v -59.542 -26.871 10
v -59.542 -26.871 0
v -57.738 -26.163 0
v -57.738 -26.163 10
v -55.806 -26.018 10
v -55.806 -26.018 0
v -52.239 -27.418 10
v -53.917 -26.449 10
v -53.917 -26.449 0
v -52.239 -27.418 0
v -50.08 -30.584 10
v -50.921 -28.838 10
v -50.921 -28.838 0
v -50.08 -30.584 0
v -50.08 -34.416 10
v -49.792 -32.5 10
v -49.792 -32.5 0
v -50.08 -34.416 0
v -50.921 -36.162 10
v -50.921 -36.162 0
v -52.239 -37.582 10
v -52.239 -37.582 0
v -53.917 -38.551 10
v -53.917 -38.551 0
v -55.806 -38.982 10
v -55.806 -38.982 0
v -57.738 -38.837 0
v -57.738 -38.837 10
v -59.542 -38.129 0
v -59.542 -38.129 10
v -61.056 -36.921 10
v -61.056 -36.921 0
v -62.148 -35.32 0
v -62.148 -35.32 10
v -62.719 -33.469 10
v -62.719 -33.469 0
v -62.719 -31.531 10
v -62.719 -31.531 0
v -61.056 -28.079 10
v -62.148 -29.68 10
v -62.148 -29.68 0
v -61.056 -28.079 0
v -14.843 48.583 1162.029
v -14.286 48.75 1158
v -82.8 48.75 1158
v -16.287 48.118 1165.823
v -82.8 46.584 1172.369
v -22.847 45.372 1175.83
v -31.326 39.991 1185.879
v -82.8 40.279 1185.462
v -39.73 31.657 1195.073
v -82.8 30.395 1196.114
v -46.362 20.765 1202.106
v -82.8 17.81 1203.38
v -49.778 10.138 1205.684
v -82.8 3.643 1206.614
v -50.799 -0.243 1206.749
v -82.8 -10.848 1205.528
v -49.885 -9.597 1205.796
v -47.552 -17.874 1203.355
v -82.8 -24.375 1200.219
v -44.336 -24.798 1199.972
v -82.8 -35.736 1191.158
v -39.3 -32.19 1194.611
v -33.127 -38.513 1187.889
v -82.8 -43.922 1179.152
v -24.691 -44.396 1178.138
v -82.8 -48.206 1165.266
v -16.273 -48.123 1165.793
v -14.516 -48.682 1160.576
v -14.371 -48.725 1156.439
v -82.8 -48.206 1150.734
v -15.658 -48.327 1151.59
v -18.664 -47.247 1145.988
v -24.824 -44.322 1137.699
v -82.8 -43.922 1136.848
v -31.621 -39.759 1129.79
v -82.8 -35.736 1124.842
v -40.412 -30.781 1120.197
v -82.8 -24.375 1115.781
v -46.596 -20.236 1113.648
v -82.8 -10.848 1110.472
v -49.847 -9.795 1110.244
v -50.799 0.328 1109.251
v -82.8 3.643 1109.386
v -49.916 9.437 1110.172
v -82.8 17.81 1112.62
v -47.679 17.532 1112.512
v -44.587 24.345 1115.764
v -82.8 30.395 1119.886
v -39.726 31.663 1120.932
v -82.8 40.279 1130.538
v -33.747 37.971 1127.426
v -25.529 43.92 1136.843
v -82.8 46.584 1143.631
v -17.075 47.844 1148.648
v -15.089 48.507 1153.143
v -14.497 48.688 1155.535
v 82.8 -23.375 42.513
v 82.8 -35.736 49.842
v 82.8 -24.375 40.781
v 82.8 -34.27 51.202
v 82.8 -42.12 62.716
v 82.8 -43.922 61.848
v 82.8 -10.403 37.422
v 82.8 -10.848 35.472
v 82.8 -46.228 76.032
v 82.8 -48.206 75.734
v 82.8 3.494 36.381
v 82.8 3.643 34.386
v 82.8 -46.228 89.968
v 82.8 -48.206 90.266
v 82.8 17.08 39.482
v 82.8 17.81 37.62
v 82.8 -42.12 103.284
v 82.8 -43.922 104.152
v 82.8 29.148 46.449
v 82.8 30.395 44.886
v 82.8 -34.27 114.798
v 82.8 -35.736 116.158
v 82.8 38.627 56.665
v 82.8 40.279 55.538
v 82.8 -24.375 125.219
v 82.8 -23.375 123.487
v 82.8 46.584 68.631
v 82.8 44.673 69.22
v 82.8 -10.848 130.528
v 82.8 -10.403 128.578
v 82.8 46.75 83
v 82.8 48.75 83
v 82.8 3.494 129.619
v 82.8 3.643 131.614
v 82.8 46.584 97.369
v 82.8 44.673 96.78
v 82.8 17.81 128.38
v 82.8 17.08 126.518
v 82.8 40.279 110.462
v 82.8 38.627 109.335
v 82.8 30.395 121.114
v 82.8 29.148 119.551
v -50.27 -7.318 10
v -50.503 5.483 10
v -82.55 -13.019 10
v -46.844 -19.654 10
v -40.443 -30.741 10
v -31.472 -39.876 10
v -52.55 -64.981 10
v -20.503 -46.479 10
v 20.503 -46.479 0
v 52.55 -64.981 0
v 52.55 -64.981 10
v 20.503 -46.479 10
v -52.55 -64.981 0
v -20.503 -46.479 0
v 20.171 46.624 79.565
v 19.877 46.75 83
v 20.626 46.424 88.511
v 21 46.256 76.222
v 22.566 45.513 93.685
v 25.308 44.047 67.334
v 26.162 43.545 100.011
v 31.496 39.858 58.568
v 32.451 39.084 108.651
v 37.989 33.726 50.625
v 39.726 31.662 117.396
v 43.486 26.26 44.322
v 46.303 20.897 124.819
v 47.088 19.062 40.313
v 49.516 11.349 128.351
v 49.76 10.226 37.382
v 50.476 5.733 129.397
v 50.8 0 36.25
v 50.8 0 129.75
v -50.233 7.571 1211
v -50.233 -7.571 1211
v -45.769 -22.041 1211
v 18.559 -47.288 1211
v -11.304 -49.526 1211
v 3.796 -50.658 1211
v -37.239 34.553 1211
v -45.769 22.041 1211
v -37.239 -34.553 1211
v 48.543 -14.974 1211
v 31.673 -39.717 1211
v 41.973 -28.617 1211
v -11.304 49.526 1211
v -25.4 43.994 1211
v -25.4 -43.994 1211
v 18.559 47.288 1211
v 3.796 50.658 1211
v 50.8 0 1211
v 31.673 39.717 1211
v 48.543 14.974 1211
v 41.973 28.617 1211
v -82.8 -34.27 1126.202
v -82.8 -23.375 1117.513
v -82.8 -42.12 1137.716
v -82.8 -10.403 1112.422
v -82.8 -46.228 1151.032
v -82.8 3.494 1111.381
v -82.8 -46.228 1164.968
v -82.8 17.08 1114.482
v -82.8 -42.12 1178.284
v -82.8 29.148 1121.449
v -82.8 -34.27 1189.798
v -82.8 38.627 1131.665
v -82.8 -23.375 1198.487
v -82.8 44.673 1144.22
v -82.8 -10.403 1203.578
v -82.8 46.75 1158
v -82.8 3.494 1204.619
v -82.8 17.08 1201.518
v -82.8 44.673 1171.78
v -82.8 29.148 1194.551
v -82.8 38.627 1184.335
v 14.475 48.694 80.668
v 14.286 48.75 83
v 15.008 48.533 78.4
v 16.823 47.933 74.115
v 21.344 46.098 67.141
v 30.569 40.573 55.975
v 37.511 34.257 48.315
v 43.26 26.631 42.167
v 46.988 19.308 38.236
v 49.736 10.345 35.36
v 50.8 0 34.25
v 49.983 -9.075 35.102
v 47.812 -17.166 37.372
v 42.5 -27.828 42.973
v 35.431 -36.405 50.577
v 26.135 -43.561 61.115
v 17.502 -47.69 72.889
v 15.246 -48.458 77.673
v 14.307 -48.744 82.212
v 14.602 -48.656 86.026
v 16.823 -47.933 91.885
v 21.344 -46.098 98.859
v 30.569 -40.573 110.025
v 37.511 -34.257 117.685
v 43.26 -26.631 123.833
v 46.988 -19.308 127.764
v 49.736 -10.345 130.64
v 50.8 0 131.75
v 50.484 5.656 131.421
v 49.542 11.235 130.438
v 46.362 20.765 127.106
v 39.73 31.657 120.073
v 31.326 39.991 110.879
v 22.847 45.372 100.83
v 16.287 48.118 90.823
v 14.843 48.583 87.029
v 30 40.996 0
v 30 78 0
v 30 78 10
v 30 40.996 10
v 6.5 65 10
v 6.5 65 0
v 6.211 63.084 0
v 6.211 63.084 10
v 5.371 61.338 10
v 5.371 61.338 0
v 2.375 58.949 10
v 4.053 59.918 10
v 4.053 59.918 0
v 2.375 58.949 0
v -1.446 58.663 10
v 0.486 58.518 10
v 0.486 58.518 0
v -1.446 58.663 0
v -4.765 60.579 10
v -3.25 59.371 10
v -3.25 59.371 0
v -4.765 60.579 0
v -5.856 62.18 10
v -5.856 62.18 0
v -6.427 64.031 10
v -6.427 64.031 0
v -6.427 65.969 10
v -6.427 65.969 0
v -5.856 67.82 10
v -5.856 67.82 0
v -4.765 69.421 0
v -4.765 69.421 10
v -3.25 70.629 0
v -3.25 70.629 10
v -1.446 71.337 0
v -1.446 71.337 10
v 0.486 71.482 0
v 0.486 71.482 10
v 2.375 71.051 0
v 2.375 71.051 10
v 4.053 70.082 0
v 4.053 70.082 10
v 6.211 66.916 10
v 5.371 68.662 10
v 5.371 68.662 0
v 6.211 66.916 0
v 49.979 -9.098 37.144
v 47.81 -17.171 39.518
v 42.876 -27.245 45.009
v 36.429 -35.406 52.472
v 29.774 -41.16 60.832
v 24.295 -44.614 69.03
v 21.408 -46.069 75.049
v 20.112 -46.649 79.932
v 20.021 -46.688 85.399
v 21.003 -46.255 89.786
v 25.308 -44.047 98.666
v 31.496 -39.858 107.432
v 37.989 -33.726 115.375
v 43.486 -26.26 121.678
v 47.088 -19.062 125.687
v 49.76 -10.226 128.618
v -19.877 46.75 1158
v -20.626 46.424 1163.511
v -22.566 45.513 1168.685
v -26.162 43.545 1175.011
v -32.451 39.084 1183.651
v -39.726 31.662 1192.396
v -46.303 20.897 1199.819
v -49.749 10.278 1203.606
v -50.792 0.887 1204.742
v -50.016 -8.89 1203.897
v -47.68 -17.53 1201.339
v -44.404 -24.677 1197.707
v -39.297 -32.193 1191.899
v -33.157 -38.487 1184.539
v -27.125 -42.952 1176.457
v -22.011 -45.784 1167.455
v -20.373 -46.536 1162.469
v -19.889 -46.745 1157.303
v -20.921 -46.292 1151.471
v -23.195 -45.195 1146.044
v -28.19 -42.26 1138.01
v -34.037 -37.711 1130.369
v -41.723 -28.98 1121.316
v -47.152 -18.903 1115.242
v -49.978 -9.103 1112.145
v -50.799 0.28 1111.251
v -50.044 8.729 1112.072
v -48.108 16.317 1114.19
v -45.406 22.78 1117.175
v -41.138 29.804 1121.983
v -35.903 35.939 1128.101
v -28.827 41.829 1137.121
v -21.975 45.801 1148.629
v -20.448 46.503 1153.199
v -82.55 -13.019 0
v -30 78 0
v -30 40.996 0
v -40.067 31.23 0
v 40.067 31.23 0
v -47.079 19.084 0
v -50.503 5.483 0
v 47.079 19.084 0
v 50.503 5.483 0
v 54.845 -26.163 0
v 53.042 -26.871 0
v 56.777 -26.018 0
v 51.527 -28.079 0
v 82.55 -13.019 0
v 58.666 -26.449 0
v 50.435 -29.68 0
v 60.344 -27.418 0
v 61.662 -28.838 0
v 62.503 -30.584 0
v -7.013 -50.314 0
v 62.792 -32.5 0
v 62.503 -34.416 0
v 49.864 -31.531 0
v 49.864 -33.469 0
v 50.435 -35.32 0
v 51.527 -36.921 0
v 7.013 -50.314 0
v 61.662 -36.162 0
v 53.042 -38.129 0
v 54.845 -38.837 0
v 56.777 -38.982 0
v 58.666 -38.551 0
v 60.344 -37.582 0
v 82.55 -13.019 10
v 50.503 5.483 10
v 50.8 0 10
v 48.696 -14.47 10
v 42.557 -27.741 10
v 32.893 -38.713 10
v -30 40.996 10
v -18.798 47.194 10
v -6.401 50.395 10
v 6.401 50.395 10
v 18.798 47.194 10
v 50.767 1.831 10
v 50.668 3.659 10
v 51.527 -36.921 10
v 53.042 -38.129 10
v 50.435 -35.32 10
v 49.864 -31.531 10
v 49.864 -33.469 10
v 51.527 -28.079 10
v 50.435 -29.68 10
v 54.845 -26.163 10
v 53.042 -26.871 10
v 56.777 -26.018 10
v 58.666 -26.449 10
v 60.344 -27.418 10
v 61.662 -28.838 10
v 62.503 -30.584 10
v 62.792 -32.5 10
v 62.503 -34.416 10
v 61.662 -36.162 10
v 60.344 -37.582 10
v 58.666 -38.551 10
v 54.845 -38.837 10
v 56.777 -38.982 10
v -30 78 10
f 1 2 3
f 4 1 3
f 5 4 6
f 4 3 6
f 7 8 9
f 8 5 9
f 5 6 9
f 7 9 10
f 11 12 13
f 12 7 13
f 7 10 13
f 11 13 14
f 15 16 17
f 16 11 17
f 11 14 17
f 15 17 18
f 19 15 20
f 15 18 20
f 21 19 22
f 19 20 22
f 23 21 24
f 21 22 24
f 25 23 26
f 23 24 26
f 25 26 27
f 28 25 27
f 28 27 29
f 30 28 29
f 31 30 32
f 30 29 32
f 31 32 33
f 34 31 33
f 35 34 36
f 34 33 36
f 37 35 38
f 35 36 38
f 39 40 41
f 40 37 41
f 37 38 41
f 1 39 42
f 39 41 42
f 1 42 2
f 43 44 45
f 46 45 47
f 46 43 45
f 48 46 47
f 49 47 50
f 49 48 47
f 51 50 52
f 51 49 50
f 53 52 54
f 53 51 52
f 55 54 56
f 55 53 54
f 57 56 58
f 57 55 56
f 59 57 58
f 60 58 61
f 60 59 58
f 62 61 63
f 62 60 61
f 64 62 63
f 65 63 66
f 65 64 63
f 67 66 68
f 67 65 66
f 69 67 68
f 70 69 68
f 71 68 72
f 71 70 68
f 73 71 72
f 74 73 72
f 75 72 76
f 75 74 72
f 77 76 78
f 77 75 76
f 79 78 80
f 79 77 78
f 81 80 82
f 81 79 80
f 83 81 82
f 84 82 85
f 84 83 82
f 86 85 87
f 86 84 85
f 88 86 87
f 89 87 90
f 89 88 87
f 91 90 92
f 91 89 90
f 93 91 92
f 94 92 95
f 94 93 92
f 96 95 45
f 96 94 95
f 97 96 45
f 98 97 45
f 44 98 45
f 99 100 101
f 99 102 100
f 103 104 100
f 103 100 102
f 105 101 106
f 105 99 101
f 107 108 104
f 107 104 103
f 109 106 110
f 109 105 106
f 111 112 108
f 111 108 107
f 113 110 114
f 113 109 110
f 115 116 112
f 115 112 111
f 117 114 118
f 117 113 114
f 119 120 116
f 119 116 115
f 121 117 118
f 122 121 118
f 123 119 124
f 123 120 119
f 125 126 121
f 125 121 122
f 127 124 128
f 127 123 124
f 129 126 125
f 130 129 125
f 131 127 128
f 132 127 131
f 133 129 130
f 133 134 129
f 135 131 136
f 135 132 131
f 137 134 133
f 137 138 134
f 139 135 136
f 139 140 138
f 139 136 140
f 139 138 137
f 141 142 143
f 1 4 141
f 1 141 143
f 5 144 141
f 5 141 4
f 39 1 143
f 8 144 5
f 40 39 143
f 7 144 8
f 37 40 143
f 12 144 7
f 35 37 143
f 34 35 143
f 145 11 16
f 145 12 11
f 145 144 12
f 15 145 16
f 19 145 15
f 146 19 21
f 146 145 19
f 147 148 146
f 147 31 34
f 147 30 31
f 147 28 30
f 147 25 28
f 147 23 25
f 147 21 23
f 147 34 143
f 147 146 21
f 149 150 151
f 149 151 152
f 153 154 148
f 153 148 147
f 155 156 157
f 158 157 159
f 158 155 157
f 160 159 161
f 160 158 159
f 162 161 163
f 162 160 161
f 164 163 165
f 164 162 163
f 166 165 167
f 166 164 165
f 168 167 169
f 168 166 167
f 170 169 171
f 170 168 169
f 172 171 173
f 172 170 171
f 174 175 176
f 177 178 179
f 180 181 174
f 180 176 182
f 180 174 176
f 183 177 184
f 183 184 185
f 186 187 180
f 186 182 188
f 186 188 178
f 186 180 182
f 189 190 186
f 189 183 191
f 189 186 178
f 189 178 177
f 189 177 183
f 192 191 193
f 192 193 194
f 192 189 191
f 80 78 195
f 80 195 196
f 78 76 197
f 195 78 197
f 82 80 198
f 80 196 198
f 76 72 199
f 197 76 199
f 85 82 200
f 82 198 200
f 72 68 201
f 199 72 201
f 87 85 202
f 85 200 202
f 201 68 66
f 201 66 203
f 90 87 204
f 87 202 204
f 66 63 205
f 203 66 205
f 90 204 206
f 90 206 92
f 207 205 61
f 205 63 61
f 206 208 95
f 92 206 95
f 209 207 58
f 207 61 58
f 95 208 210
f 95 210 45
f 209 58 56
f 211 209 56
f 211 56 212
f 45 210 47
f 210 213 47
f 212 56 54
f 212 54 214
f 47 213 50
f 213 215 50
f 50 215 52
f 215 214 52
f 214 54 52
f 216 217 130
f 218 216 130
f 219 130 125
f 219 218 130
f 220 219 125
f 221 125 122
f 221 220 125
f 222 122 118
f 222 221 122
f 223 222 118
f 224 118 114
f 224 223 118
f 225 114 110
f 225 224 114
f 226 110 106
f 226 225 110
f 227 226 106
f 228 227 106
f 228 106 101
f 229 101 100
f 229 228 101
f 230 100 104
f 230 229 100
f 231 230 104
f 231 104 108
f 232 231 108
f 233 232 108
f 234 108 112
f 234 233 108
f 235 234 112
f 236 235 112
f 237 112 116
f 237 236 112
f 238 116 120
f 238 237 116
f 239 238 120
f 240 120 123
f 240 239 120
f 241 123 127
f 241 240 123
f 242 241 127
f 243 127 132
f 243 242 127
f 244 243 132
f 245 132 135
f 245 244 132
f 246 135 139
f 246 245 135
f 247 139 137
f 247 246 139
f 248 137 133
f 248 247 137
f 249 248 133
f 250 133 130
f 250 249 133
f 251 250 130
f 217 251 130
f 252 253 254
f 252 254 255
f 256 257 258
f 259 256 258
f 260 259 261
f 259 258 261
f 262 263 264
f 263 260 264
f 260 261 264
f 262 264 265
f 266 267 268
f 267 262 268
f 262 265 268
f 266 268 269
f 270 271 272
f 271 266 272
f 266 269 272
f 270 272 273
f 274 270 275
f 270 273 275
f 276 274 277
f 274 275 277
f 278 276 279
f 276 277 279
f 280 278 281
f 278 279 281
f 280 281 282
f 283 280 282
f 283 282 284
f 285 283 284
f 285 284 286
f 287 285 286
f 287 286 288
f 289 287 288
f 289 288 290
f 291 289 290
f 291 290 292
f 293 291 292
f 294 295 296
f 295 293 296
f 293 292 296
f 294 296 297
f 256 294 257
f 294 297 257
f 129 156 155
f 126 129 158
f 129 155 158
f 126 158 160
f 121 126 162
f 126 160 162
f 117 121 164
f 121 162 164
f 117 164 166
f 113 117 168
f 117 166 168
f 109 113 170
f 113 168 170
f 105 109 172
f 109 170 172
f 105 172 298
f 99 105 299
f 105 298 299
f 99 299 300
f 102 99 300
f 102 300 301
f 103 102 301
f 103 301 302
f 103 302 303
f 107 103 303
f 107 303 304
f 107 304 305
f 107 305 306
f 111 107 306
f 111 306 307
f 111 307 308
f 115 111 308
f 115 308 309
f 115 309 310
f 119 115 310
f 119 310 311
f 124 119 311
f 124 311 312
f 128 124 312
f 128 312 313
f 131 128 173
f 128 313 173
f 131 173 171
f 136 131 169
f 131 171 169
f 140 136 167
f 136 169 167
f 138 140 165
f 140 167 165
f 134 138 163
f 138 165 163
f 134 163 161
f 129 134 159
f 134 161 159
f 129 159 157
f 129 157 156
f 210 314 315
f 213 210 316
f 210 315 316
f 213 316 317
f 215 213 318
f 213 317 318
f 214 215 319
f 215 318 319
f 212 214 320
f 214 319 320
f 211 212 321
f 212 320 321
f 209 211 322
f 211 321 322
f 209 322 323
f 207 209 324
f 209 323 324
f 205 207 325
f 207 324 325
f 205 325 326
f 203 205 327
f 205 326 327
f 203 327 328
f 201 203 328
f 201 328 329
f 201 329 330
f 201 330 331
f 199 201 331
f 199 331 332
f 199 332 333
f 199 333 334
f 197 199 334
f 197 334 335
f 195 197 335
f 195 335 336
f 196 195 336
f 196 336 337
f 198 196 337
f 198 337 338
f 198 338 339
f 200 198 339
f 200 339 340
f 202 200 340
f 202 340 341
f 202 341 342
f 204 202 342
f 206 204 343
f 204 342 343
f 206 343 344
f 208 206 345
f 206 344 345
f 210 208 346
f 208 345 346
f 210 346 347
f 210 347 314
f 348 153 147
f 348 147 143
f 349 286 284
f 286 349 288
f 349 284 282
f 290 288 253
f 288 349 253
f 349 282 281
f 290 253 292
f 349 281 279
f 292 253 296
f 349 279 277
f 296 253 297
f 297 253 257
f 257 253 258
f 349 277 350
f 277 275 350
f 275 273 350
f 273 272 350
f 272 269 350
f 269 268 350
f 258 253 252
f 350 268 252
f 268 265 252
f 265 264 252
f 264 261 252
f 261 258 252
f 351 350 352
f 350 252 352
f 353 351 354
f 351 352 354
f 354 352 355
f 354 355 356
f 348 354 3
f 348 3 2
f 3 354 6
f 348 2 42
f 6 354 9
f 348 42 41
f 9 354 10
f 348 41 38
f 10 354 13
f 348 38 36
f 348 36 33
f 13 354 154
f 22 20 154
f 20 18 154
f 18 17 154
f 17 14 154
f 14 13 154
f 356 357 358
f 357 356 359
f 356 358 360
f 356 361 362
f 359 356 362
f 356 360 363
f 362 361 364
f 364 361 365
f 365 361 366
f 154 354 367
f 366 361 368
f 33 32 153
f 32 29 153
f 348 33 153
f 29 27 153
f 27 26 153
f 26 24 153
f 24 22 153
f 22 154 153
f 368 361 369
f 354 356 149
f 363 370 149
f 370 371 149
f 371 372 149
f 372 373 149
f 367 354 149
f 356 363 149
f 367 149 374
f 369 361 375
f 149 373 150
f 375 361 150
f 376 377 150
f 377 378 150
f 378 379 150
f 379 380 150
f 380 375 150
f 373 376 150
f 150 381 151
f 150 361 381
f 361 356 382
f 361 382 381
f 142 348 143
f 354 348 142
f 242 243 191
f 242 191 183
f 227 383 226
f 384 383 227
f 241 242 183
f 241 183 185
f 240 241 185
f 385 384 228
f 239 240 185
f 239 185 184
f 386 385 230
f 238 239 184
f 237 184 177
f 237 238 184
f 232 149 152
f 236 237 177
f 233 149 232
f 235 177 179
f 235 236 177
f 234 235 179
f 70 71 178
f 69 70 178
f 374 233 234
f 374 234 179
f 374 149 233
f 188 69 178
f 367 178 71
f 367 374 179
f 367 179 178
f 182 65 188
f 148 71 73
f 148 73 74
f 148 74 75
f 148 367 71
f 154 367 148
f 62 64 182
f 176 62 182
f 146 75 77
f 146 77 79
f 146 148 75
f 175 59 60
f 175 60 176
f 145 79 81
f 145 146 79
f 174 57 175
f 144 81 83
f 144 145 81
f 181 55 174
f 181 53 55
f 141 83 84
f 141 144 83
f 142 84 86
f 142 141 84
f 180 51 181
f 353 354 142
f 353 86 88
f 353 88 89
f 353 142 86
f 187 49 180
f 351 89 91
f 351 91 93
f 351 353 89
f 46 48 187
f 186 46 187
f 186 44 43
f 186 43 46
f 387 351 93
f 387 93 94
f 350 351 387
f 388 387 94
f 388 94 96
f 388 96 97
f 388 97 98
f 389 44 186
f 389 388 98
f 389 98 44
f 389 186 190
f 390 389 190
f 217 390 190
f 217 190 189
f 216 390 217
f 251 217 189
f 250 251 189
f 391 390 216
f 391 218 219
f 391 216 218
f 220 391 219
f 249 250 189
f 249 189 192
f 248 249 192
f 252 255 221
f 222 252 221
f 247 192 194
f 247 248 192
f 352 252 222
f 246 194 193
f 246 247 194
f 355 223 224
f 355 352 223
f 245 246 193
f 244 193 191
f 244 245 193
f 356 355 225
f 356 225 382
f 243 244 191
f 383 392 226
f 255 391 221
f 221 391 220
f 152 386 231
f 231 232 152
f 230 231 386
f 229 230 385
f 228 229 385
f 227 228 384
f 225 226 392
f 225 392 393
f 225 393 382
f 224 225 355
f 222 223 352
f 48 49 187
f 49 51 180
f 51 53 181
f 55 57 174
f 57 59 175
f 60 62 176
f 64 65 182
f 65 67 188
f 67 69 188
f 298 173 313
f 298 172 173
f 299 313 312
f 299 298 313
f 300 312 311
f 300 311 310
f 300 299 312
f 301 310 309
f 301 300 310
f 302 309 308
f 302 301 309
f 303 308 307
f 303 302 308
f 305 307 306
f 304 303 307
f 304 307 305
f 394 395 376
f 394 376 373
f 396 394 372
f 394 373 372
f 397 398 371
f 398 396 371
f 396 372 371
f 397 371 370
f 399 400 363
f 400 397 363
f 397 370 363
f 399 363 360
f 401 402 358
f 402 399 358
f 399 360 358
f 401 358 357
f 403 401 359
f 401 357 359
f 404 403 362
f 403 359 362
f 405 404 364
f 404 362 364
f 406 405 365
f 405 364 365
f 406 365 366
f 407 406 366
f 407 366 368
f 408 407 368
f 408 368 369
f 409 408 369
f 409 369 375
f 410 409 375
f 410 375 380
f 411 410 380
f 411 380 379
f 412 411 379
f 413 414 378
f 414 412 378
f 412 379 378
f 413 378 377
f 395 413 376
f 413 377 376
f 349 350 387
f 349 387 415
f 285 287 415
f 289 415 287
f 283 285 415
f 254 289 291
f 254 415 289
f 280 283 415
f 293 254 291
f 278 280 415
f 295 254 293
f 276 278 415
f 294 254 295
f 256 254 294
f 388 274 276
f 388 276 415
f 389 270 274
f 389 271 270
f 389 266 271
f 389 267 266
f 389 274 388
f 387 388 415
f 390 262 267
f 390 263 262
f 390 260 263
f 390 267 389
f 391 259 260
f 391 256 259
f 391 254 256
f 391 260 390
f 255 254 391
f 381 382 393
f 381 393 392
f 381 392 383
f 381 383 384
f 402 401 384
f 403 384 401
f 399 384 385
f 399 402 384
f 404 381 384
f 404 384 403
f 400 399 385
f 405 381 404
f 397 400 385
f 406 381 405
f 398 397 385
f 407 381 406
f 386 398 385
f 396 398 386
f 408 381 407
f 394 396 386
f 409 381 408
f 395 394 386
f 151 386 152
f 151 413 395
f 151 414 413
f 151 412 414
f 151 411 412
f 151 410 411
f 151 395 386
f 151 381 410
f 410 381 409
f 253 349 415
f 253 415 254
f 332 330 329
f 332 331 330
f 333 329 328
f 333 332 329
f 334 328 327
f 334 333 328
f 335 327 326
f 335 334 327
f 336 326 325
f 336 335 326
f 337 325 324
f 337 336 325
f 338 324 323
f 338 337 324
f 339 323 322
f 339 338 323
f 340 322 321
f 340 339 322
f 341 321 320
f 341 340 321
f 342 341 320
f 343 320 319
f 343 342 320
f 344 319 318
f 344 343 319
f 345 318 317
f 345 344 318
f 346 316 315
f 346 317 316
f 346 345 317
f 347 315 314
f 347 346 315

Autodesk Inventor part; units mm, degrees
ref_plane "YZ Plane" through (0, 0, 0) normal (1, 0, 0) x (0, 1, 0)
ref_plane "XZ Plane" through (0, 0, 0) normal (0, 1, 0) x (-1, 0, 0)
ref_plane "XY Plane" through (0, 0, 0) normal (0, 0, 1) x (1, 0, 0)
sketch "Sketch1" plane through (0, 0, 0) normal (0, 0, 1) x (1, 0, 0)
  line L0 (-30, 78) -> (30, 78)
  line L1 (30, 78) -> (30, 8)
  line L2 (30, 8) -> (-30, 8)
  line L3 (-30, 8) -> (-30, 78)
  line L4 (119.0409, 377.068) -> (884.0572, 377.068) construction
  line L5 (884.0572, 377.068) -> (884.0572, -61.283) construction
  line L6 (884.0572, -61.283) -> (119.0409, -61.283) construction
  line L7 (119.0409, -61.283) -> (119.0409, 377.068) construction
  line L8 (528.2997, 310.003) -> (528.2997, 129.9198)
  line L9 (528.2997, 219.9614) -> (642.893, 286.807)
  circle A0 centre (0, 65) radius 6.5
  point P0 (0, 0)
  point P1 (0, 8)
  point P2 (0, 78)
  dimension "d9" = 60
  dimension "d10" = 70
  dimension "d13" = 78
  dimension "d14" = 13
  dimension "d15" = 13
extrude "Extrusion1" add sketch "Sketch1" along normal blind 10
pattern_circular "Circular Pattern1" count 3 over 360 about axis through (0, 0, -10) along (0, 0, 1) of "Extrusion1"
sketch "Sketch2" plane through (0, 0, 0) normal (0, 0, 1) x (1, 0, 0)
  circle A0 centre (0, 0) radius 50.8
  dimension "d21" = 101.6
extrude "Extrusion2" add sketch "Sketch2" along normal blind 1211
sketch "Sketch3" plane through (0, 0, 0) normal (1, 0, 0) x (0, 1, 0)
  circle A0 centre (0, 83) radius 48.75
  circle A1 centre (0, 83) radius 46.75
  point P0 (0, 0)
  dimension "d24" = 97.5
  dimension "d25" = 83
  dimension "d112" = 2
extrude "Extrusion3" add sketch "Sketch3" along normal blind 82.8
sketch "Sketch4" plane through (0, 0, 0) normal (1, 0, 0) x (0, 1, 0)
  circle A0 centre (0, 1158) radius 48.75
  line L0 (508.6061, 725.4056) -> (1697.4131, 725.4056) construction
  line L1 (1697.4131, 725.4056) -> (1697.4131, 178.9914) construction
  line L2 (1697.4131, 178.9914) -> (508.6061, 178.9914) construction
  line L3 (508.6061, 178.9914) -> (508.6061, 725.4056) construction
  line L4 (1437.8763, 515.5441) -> (1697.4131, 515.5441)
  line L5 (1697.4131, 515.5441) -> (1697.4131, 335.5441)
  line L6 (1697.4131, 335.5441) -> (1437.8763, 335.5441)
  line L7 (1437.8763, 335.5441) -> (1437.8763, 515.5441)
  line L8 (1526.1756, 486.7469) -> (1616.156, 486.7469)
  line L9 (40.9956, 0) -> (40.9956, 10) projected
  line L10 (40.9956, 0) -> (5.483, 0) projected
  line L11 (5.483, 10) -> (5.483, 0) projected
  line L12 (-46.4786, 10) -> (5.483, 10) projected
  line L13 (-46.4786, 0) -> (-46.4786, 10) projected
  line L14 (-46.4786, 0) -> (-46.4786, 0) projected
  line L15 (-46.4786, 10) -> (-46.4786, 0) projected
  line L16 (5.483, 10) -> (-46.4786, 10) projected
  line L17 (5.483, 0) -> (5.483, 10) projected
  line L18 (5.483, 0) -> (40.9956, 0) projected
  line L19 (40.9956, 10) -> (40.9956, 0) projected
  line L20 (40.9956, 10) -> (40.9956, 10) projected
  line L21 (50.8, 1211) -> (-50.8, 1211) projected
  circle A1 centre (0, 1158) radius 46.75
  line L22 (78, 0) -> (40.9956, 0) projected
  point P0 (0, 0)
  point P1 (48.75, 83)
  dimension "d28" = 97.5
  dimension "d71" = 180
  dimension "d90" = 89.9804
  dimension "d93" = 53
  dimension "d103" = 2
  dimension "d114" = 1158
extrude "Extrusion4" add sketch "Sketch4" against normal blind 82.8 contours A0
sketch "Sketch5" plane through (-82.8, 0, 1158) normal (-1, 0, 0) x (0, 0, 1)
  circle A0 centre (0, 0) radius 48.75 projected
  circle A1 centre (0, 0) radius 110
  circle A2 centre (0, 0) radius 90 construction
  circle A3 centre (90, 0) radius 8
  circle A4 centre (63.6396, 63.6396) radius 8
  circle A5 centre (0, 90) radius 8
  circle A6 centre (-63.6396, 63.6396) radius 8
  circle A7 centre (-90, 0) radius 8
  circle A8 centre (-63.6396, -63.6396) radius 8
  circle A9 centre (0, -90) radius 8
  circle A10 centre (63.6396, -63.6396) radius 8
  point P0 (-1158, 0)
  dimension "d95" = 180
  dimension "d94" = 220
  dimension "d96" = 16
  dimension "d99" = 360
extrude "Extrusion5" [suppressed]
sketch "Sketch6" plane through (82.8, 0, 83) normal (1, 0, 0) x (0, 0, -1)
  circle A0 centre (0, 0) radius 110
  circle A1 centre (0, 0) radius 90 construction
  circle A2 centre (-90, 0) radius 8
  circle A3 centre (-63.6396, -63.6396) radius 8
  circle A4 centre (0, -90) radius 8
  circle A5 centre (63.6396, -63.6396) radius 8
  circle A6 centre (90, 0) radius 8
  circle A7 centre (63.6396, 63.6396) radius 8
  circle A8 centre (0, 90) radius 8
  circle A9 centre (-63.6396, 63.6396) radius 8
  circle A10 centre (0, 0) radius 48.75 projected
  point P0 (83, 0)
  dimension "d107" = 180
  dimension "d106" = 220
  dimension "d108" = 16
  dimension "d109" = 360
extrude "Extrusion6" [suppressed]
equation "\"d21\" = main_diameter"
equation "\"d22\" = main_height"
equation "\"d24\" = connect_pipe"
equation "\"d28\" = connect_pipe"
equation "\"main_height\" = 1211"
equation "\"connect_pipe\" = 97.5"
equation "\"main_diameter\" = 101.6"
properties part number "UV-Cleaner ODV-15"
